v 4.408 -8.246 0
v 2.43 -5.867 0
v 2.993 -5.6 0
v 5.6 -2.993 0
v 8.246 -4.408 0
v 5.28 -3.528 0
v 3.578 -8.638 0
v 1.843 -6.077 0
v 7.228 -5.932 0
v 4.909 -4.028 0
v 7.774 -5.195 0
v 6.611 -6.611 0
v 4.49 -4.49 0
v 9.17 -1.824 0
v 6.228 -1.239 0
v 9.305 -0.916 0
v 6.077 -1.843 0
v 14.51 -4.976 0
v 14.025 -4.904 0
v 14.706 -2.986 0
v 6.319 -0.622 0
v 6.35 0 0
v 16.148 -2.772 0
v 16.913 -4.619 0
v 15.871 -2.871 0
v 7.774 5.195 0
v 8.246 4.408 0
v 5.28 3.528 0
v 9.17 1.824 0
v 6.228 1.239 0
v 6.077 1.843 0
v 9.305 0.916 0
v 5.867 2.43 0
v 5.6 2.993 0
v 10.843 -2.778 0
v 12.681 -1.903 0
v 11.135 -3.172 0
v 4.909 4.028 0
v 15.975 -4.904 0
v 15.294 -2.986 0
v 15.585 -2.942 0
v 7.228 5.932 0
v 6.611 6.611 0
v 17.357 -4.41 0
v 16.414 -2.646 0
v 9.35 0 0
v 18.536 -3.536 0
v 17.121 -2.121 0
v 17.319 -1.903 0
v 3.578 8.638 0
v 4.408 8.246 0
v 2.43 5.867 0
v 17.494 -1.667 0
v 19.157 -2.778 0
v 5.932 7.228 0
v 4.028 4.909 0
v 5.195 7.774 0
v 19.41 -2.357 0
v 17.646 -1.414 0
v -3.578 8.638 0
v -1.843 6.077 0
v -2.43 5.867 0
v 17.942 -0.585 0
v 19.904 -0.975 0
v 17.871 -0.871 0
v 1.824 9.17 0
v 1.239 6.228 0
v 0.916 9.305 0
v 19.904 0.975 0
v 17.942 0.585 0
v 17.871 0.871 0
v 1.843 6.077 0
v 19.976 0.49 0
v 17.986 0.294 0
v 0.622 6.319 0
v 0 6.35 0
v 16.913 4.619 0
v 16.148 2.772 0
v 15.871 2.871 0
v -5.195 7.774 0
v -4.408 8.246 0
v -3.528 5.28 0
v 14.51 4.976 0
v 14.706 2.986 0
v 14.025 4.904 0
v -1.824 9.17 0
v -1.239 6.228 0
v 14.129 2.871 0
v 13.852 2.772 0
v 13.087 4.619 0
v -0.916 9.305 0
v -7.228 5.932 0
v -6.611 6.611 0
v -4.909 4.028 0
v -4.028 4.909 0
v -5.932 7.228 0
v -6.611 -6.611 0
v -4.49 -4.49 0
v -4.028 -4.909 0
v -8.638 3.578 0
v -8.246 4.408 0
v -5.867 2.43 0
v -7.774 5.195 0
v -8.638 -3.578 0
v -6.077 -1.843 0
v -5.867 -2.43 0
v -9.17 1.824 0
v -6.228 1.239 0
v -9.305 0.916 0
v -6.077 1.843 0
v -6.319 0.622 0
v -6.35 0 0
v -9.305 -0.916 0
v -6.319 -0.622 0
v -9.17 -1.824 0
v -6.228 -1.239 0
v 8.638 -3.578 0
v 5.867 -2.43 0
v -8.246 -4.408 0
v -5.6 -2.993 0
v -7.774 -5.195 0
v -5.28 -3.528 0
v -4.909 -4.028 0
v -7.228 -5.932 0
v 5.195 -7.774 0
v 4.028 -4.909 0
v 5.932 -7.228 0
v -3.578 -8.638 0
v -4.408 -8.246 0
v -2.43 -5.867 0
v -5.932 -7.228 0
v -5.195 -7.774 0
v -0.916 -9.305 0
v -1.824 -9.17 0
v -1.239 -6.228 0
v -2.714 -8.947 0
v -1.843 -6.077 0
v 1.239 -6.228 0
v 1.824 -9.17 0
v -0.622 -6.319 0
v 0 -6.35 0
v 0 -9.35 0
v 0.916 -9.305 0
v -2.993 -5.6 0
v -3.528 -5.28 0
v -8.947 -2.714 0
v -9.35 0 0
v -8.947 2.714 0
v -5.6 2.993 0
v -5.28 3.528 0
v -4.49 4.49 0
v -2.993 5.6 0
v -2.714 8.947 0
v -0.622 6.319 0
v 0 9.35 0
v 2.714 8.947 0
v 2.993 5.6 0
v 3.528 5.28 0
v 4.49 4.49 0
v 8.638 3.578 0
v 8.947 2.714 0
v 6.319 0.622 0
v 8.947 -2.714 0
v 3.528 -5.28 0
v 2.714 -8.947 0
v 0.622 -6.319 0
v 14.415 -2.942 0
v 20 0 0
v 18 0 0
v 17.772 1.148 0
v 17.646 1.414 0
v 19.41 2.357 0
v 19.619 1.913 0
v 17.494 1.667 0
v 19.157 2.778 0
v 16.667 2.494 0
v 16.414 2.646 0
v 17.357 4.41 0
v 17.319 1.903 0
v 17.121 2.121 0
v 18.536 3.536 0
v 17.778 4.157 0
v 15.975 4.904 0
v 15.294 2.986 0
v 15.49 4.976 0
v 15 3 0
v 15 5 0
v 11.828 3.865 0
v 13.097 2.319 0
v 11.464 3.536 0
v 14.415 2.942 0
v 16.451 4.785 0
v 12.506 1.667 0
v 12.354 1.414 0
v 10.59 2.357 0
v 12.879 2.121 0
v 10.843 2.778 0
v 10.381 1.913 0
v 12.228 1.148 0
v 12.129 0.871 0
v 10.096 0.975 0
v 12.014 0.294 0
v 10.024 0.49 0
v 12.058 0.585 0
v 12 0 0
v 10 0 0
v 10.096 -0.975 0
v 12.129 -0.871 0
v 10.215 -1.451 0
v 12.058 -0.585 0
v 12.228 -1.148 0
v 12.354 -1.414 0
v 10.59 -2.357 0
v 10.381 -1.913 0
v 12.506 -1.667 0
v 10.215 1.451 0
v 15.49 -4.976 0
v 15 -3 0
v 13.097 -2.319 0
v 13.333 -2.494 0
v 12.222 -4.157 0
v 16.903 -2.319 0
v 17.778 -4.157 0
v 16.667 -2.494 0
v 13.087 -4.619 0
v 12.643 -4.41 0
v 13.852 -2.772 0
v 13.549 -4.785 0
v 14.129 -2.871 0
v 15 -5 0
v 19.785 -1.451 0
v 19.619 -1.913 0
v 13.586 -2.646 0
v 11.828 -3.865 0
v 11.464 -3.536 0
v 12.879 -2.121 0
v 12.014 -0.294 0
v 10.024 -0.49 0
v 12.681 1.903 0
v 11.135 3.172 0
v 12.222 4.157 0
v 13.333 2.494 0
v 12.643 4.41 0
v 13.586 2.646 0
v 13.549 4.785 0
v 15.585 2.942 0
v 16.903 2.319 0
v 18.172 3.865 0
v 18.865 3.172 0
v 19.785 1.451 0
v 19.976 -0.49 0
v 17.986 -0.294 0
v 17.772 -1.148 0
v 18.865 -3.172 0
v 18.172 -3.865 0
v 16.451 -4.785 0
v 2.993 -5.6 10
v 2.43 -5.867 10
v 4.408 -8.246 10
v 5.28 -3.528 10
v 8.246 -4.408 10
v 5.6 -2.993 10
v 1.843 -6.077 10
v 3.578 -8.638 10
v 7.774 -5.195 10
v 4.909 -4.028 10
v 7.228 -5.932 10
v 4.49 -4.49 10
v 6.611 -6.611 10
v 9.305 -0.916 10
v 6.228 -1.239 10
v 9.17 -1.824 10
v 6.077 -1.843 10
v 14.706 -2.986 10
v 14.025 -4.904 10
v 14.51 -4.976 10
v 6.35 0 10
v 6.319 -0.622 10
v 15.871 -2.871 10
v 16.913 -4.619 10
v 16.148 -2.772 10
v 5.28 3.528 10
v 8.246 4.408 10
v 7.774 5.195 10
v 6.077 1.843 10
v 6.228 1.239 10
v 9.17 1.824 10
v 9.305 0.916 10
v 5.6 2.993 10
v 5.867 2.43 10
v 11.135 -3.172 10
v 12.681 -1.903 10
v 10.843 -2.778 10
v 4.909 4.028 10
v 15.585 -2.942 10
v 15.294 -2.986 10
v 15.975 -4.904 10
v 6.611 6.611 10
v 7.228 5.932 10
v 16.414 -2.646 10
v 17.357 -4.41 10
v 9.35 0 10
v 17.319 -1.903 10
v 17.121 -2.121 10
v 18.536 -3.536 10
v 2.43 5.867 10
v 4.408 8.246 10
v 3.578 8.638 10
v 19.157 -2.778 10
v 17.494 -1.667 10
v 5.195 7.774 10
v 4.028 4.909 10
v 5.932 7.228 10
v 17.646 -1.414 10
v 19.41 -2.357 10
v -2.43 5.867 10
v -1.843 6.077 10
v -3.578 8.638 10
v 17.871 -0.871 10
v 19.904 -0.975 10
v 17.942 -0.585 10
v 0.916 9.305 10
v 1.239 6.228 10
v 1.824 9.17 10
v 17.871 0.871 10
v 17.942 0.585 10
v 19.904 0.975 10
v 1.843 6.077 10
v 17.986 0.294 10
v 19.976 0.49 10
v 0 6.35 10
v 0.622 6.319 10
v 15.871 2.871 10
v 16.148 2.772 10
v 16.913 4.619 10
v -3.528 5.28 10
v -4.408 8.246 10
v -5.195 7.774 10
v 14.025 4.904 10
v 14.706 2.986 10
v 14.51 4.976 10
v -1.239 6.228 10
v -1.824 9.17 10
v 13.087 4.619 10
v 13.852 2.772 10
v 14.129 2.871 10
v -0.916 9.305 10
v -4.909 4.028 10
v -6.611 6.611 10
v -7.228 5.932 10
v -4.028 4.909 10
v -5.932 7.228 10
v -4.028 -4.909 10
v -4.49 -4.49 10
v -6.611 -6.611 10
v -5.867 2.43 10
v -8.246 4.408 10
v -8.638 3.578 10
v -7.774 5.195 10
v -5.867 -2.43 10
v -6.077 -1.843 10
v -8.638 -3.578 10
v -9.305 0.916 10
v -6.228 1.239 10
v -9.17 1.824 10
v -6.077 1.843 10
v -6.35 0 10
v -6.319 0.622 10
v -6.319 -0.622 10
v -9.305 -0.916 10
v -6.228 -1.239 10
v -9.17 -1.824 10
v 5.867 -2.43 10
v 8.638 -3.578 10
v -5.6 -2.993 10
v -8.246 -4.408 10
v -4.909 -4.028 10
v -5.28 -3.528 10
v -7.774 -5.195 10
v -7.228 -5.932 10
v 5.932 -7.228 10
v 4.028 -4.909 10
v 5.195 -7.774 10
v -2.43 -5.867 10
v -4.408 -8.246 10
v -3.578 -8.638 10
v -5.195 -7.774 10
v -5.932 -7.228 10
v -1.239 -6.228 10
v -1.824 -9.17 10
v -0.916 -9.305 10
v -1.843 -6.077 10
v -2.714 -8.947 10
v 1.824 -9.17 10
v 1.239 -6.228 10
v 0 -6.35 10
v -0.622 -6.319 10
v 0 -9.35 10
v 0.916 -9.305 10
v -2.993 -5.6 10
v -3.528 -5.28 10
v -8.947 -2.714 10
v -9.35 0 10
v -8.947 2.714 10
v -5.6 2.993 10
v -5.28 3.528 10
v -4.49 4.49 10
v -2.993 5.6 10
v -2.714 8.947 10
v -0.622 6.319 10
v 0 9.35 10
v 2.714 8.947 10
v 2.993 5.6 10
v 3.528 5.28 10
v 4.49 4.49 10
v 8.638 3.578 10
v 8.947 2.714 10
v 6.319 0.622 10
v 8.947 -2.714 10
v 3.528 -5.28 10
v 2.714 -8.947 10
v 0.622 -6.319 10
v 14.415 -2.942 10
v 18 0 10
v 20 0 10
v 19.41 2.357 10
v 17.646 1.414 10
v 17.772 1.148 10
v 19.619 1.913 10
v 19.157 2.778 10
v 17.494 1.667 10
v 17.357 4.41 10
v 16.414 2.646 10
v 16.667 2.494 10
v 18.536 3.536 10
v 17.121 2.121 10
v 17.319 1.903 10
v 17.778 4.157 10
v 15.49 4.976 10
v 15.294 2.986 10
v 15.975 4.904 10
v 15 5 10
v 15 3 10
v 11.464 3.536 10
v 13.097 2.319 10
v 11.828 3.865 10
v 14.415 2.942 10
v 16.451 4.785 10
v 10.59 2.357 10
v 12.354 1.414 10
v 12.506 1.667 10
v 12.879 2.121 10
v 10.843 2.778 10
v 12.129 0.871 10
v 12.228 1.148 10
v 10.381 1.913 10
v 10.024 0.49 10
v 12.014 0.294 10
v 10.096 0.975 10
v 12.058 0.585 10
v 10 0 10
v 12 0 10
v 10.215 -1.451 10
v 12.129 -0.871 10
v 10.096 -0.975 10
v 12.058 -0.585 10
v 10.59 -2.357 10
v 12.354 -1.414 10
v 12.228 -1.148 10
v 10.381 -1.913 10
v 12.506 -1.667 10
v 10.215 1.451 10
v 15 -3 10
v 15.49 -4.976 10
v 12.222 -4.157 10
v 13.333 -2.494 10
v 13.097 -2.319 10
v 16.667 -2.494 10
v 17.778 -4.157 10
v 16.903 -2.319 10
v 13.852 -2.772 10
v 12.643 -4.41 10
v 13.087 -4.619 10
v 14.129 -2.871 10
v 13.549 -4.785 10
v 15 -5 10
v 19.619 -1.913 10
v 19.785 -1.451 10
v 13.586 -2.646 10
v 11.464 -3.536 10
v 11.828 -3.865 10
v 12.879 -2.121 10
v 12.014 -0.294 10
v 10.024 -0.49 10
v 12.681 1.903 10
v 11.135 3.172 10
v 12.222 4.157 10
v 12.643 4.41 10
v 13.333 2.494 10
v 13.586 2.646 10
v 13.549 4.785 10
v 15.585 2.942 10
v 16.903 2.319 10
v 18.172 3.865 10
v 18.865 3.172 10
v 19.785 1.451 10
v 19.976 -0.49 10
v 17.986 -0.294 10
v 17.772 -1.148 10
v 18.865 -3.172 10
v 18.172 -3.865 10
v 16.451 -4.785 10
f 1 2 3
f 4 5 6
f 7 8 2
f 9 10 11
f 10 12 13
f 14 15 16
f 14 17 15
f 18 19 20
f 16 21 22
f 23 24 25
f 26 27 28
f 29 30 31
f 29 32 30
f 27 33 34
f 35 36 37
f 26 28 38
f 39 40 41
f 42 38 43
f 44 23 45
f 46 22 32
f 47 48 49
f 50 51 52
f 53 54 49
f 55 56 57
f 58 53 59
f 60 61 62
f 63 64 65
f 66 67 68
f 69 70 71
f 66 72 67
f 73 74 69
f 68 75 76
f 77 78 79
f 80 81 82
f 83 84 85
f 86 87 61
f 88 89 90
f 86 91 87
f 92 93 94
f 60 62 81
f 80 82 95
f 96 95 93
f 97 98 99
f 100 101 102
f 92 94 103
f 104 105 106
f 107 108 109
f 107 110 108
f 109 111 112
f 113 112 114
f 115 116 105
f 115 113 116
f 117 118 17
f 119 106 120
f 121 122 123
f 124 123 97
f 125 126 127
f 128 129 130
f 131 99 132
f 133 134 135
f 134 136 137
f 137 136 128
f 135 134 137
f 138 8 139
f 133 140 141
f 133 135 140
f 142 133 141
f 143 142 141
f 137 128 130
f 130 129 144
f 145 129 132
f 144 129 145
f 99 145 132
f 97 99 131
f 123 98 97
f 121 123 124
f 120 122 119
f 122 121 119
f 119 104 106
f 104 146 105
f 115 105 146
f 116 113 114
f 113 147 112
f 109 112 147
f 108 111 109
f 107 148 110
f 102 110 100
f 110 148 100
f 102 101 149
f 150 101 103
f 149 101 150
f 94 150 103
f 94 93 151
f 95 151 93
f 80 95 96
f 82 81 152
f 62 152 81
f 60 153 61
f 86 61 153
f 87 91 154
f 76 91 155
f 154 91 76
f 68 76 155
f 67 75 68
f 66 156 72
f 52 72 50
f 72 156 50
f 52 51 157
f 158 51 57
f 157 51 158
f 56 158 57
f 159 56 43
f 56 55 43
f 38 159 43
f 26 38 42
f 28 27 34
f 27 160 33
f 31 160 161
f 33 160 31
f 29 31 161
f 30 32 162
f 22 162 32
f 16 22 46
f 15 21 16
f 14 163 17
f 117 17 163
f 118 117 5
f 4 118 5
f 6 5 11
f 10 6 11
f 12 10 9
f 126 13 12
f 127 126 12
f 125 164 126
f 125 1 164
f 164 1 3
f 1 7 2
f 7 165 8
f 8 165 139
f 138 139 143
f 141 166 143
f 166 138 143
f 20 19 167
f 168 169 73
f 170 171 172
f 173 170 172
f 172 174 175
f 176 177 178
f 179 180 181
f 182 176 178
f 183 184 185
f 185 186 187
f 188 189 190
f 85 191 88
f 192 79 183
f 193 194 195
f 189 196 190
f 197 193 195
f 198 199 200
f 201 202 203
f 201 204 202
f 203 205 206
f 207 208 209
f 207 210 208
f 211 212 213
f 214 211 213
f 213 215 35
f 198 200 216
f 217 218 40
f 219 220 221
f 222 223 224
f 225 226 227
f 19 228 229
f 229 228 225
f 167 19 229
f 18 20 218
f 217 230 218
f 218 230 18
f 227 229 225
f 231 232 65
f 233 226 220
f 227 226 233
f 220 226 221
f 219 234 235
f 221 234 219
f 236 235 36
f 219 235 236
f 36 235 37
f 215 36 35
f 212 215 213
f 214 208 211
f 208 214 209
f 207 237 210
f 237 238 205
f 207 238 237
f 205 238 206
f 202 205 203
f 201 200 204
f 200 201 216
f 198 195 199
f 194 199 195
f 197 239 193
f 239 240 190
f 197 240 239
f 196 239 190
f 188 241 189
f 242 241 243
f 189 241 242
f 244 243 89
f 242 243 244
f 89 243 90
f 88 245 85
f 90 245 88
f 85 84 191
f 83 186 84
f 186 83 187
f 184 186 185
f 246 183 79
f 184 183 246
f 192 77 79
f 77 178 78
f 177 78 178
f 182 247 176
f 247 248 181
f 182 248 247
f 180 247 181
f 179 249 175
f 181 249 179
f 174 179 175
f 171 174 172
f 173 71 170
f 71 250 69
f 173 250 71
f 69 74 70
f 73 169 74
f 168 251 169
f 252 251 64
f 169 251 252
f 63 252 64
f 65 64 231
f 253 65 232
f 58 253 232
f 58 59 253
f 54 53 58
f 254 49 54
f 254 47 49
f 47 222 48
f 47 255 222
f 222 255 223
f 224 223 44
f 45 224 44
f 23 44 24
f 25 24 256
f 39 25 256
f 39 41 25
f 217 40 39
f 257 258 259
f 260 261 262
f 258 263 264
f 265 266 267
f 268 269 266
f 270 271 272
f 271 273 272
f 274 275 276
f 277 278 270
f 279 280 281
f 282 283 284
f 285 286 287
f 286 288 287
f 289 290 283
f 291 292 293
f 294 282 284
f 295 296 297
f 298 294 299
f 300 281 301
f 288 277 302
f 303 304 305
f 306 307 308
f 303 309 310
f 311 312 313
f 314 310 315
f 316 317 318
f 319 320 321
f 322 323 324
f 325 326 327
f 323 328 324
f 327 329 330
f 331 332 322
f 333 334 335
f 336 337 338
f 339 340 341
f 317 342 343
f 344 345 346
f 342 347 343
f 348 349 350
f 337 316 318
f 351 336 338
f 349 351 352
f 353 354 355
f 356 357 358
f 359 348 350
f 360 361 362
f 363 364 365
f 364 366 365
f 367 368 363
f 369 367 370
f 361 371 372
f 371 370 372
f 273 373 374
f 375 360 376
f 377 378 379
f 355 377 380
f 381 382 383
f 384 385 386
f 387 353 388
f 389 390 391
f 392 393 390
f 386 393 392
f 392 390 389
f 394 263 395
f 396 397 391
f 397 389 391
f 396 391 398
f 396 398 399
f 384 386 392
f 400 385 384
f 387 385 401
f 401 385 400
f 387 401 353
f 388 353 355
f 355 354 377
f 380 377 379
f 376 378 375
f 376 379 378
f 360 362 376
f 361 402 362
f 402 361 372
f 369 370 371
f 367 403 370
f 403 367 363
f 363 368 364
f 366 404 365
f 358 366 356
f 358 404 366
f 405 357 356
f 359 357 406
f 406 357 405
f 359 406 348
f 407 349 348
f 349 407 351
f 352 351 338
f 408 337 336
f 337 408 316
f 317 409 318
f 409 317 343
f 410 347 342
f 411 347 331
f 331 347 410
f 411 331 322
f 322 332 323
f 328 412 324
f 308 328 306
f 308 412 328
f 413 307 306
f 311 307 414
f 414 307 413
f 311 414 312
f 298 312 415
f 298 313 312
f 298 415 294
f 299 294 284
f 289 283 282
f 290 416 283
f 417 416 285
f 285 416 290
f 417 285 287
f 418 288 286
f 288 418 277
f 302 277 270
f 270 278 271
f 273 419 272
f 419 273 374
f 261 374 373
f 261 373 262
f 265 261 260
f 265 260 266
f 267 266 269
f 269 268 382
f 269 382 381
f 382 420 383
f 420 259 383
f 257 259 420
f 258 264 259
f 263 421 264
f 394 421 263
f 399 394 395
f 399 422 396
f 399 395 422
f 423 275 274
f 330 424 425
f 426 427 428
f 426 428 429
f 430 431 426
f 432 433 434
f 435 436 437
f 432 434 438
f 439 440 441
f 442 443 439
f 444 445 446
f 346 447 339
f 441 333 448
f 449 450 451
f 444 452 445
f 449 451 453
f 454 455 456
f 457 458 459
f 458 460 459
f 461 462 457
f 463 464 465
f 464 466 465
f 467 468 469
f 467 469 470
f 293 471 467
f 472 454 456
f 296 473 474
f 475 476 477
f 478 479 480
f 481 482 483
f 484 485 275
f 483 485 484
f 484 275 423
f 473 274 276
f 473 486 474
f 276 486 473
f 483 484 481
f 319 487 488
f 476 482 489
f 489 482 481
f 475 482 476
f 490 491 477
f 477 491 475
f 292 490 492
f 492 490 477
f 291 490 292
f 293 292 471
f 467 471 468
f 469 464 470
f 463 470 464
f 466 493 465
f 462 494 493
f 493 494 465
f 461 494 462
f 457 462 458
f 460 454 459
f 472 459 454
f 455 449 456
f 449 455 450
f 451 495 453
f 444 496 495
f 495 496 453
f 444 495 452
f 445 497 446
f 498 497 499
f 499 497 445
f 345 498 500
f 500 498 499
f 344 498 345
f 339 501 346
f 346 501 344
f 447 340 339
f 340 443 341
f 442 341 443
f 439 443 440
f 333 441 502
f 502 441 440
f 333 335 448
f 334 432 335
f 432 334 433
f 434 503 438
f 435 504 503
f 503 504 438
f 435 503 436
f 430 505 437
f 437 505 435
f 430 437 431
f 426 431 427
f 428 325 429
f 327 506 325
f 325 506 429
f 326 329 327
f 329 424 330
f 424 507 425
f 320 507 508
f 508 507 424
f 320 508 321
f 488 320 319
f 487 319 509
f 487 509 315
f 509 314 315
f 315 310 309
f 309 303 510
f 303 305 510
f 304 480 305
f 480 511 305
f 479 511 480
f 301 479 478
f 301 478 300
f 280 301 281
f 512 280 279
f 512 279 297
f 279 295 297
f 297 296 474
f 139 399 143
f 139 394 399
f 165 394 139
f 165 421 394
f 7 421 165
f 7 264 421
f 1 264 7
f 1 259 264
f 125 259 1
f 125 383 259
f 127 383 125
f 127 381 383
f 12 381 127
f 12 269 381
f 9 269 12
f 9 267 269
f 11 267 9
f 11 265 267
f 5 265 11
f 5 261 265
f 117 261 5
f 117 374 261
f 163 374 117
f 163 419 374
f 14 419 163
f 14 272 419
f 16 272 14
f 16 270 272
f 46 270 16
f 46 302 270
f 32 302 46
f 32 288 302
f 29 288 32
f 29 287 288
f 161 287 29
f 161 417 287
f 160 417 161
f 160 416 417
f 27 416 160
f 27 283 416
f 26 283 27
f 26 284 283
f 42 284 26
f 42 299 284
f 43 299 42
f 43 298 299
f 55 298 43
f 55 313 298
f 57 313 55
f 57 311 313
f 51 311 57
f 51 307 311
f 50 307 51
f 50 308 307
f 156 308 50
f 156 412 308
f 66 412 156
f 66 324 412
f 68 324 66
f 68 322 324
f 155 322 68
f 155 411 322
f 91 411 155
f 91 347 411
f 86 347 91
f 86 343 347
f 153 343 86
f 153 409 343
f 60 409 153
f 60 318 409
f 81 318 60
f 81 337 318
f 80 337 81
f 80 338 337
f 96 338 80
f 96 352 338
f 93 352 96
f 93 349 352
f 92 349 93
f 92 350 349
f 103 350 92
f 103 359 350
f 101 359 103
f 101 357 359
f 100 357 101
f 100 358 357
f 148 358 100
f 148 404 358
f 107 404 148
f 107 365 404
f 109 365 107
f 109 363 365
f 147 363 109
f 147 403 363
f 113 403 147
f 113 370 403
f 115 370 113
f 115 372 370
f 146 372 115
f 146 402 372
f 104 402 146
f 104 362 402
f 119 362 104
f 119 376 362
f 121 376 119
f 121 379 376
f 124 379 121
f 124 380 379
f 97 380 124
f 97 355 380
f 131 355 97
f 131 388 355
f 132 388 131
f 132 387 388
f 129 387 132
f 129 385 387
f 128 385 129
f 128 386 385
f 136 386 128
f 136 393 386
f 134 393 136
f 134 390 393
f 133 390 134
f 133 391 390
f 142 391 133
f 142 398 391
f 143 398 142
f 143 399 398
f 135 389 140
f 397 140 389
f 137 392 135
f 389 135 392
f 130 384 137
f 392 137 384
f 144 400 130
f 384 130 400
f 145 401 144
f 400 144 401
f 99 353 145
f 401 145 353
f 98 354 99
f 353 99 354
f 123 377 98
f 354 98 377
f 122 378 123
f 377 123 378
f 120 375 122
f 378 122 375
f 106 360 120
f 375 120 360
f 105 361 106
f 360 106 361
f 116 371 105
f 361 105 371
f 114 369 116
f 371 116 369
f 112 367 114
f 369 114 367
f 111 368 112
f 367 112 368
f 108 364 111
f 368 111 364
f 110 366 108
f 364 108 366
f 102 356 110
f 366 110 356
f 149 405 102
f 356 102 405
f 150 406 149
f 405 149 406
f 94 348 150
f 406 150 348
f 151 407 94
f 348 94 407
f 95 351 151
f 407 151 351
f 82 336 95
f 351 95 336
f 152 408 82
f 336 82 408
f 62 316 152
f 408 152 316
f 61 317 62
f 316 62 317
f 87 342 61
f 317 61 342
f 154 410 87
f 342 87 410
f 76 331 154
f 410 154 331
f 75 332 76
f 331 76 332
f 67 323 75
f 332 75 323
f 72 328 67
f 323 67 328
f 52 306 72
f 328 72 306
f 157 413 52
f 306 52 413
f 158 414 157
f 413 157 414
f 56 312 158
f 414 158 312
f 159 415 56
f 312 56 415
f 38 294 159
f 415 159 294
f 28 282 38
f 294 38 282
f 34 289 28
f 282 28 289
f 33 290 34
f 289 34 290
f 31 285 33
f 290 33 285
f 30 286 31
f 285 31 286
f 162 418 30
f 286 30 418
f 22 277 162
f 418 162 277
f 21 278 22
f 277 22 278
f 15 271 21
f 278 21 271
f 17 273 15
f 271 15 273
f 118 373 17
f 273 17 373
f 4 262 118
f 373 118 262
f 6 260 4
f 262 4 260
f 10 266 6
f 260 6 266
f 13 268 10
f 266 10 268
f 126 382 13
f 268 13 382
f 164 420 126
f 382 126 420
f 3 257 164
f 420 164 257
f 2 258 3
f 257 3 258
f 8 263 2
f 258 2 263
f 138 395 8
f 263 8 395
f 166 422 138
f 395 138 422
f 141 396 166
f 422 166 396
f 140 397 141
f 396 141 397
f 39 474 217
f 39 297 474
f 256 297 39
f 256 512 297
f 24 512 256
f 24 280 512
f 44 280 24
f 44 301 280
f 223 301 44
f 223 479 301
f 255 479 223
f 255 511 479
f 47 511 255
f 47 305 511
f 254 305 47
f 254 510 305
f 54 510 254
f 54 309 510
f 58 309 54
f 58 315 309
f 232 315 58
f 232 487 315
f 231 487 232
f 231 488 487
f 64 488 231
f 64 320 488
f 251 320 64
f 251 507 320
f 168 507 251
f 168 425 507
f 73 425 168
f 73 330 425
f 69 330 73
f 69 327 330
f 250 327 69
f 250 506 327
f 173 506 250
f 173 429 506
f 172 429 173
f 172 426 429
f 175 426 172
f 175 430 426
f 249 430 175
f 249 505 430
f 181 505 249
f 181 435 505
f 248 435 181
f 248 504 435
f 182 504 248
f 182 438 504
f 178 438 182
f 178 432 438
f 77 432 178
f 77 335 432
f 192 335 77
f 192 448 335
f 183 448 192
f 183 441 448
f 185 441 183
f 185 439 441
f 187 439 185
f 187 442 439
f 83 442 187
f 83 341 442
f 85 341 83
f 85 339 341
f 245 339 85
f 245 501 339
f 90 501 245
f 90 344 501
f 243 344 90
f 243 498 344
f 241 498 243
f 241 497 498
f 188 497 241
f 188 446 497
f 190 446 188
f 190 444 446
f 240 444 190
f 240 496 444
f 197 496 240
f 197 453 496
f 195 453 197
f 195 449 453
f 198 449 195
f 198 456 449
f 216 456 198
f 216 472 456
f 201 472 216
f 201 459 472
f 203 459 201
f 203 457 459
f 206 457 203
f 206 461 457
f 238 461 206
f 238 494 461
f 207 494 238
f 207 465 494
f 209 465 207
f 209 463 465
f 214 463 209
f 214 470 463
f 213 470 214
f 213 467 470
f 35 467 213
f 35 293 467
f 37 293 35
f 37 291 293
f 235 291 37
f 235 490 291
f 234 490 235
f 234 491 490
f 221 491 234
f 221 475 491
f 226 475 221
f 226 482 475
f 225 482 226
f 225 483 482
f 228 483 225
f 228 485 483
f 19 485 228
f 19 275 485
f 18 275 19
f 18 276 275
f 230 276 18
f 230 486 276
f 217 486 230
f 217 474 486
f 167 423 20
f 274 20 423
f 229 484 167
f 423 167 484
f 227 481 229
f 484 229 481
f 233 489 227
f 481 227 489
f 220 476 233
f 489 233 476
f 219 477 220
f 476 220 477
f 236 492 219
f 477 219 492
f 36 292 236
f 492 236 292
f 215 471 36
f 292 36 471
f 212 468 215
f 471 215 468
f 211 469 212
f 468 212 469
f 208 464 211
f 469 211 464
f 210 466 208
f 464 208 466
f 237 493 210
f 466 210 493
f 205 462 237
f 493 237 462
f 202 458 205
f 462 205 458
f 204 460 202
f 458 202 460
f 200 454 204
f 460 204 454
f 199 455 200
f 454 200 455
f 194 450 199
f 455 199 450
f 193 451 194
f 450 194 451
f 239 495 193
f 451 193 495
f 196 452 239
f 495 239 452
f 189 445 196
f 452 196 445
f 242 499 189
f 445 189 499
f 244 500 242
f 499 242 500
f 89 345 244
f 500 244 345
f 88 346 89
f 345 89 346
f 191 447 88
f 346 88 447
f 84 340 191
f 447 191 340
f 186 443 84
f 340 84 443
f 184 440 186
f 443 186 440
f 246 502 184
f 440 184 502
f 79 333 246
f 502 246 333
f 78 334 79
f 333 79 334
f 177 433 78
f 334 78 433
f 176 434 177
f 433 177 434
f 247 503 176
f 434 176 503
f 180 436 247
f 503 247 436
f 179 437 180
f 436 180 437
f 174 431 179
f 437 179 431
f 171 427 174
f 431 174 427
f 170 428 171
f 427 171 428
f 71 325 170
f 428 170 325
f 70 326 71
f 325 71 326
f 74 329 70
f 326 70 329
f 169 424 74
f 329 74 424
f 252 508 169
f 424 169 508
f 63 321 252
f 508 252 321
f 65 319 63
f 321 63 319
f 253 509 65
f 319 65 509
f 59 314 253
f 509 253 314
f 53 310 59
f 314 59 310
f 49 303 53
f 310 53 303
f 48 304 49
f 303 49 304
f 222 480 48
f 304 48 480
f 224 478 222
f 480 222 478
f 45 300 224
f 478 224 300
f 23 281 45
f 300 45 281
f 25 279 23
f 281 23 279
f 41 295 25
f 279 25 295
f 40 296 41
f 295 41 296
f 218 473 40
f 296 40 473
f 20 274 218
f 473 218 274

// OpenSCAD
$fn = 64;

// Dimensions
rod_diameter = 12.7;           // Inner diameter of rod ring
rod_wall = 3;                 // Wall thickness of rod ring
rod_outer_diameter = rod_diameter + 2 * rod_wall; // 18.7 mm

tubing_inner_diameter = 6;     // Inner diameter of tubing ring
tubing_wall = 2;             // Wall thickness of tubing ring
tubing_outer_diameter = tubing_inner_diameter + 2 * tubing_wall; // 10 mm

bridge_width_y = 6;       // Width of bridge in Y direction
bridge_x_start = 8;          // X start of bridge
bridge_x_end = 12;         // X end of bridge

// Rod ring: centered at origin, with -X side opening
rod_ring_inner_radius = rod_diameter / 2;
rod_ring_outer_radius = rod_outer_diameter / 2;

// Tubing ring: centered at (15, 0), with +X side opening
tubing_ring_center_x = 15;
tubing_ring_center_y = 0;
tubing_ring_inner_radius = tubing_inner_diameter / 2;
tubing_ring_outer_radius = tubing_outer_diameter / 2;

// Opening dimensions
rod_opening_width = 10;     // Width of opening on rod ring (-X side)
rod_opening_y_min = -rod_opening_width / 2;
rod_opening_y_max = rod_opening_width / 2;

tubing_opening_width = 4.5; // Width of opening on tubing ring (+X side)
tubing_opening_y_min = -tubing_opening_width / 2;
tubing_opening_y_max = tubing_opening_width / 2;

// Bridge: solid between rings, 6 mm wide in Y, from x=8 to x=12
bridge_y_min = -bridge_width_y / 2;
bridge_y_max = bridge_width_y / 2;

// Main module: build 2D profile in XY plane, then extrude
module snap_clip() {
    // Use linear_extrude to make 3D from 2D profile
    linear_extrude(height = 10, center = false) {
        // Rod ring with opening on -X side
        difference() {
            // Outer ring (full circle)
            circle(r = rod_ring_outer_radius, center = [0, 0]);
            // Inner hole (full circle)
            circle(r = rod_ring_inner_radius, center = [0, 0]);
            // Cut out the opening: a rectangle from x = -rod_ring_outer_radius to x = 0, y = -5 to 5
            // Use a slightly larger rectangle to ensure full cut
            translate([-rod_ring_outer_radius - 0.1, -rod_opening_width / 2 - 0.1, 0])
            cube([rod_ring_outer_radius * 2 + 0.2, rod_opening_width + 0.2, 0.1], center = false);
        }

        // Tubing ring with opening on +X side
        translate([tubing_ring_center_x, tubing_ring_center_y, 0]) {
            difference() {
                // Outer ring (full circle)
                circle(r = tubing_ring_outer_radius, center = [0, 0]);
                // Inner hole (full circle)
                circle(r = tubing_ring_inner_radius, center = [0, 0]);
                // Cut out the opening: a rectangle from x = 15 to x = 15 + 4.5, y = -2.25 to 2.25
                // Ensure it extends slightly past the ring
                translate([tubing_ring_center_x, -tubing_opening_width / 2 - 0.1, 0])
                cube([tubing_opening_width + 0.2, tubing_opening_width + 0.2, 0.1], center = false);
            }
        }

        // Bridge between rings: solid rectangle from x=8 to x=12, y=-3 to 3
        // Must not block either ring's hole
        translate([bridge_x_start + (bridge_x_end - bridge_x_start)/2, 0, 0]) {
            cube([bridge_x_end - bridge_x_start, bridge_width_y, 0.1], center = false);
        }
    }
}

// Render the clip
snap_clip();
